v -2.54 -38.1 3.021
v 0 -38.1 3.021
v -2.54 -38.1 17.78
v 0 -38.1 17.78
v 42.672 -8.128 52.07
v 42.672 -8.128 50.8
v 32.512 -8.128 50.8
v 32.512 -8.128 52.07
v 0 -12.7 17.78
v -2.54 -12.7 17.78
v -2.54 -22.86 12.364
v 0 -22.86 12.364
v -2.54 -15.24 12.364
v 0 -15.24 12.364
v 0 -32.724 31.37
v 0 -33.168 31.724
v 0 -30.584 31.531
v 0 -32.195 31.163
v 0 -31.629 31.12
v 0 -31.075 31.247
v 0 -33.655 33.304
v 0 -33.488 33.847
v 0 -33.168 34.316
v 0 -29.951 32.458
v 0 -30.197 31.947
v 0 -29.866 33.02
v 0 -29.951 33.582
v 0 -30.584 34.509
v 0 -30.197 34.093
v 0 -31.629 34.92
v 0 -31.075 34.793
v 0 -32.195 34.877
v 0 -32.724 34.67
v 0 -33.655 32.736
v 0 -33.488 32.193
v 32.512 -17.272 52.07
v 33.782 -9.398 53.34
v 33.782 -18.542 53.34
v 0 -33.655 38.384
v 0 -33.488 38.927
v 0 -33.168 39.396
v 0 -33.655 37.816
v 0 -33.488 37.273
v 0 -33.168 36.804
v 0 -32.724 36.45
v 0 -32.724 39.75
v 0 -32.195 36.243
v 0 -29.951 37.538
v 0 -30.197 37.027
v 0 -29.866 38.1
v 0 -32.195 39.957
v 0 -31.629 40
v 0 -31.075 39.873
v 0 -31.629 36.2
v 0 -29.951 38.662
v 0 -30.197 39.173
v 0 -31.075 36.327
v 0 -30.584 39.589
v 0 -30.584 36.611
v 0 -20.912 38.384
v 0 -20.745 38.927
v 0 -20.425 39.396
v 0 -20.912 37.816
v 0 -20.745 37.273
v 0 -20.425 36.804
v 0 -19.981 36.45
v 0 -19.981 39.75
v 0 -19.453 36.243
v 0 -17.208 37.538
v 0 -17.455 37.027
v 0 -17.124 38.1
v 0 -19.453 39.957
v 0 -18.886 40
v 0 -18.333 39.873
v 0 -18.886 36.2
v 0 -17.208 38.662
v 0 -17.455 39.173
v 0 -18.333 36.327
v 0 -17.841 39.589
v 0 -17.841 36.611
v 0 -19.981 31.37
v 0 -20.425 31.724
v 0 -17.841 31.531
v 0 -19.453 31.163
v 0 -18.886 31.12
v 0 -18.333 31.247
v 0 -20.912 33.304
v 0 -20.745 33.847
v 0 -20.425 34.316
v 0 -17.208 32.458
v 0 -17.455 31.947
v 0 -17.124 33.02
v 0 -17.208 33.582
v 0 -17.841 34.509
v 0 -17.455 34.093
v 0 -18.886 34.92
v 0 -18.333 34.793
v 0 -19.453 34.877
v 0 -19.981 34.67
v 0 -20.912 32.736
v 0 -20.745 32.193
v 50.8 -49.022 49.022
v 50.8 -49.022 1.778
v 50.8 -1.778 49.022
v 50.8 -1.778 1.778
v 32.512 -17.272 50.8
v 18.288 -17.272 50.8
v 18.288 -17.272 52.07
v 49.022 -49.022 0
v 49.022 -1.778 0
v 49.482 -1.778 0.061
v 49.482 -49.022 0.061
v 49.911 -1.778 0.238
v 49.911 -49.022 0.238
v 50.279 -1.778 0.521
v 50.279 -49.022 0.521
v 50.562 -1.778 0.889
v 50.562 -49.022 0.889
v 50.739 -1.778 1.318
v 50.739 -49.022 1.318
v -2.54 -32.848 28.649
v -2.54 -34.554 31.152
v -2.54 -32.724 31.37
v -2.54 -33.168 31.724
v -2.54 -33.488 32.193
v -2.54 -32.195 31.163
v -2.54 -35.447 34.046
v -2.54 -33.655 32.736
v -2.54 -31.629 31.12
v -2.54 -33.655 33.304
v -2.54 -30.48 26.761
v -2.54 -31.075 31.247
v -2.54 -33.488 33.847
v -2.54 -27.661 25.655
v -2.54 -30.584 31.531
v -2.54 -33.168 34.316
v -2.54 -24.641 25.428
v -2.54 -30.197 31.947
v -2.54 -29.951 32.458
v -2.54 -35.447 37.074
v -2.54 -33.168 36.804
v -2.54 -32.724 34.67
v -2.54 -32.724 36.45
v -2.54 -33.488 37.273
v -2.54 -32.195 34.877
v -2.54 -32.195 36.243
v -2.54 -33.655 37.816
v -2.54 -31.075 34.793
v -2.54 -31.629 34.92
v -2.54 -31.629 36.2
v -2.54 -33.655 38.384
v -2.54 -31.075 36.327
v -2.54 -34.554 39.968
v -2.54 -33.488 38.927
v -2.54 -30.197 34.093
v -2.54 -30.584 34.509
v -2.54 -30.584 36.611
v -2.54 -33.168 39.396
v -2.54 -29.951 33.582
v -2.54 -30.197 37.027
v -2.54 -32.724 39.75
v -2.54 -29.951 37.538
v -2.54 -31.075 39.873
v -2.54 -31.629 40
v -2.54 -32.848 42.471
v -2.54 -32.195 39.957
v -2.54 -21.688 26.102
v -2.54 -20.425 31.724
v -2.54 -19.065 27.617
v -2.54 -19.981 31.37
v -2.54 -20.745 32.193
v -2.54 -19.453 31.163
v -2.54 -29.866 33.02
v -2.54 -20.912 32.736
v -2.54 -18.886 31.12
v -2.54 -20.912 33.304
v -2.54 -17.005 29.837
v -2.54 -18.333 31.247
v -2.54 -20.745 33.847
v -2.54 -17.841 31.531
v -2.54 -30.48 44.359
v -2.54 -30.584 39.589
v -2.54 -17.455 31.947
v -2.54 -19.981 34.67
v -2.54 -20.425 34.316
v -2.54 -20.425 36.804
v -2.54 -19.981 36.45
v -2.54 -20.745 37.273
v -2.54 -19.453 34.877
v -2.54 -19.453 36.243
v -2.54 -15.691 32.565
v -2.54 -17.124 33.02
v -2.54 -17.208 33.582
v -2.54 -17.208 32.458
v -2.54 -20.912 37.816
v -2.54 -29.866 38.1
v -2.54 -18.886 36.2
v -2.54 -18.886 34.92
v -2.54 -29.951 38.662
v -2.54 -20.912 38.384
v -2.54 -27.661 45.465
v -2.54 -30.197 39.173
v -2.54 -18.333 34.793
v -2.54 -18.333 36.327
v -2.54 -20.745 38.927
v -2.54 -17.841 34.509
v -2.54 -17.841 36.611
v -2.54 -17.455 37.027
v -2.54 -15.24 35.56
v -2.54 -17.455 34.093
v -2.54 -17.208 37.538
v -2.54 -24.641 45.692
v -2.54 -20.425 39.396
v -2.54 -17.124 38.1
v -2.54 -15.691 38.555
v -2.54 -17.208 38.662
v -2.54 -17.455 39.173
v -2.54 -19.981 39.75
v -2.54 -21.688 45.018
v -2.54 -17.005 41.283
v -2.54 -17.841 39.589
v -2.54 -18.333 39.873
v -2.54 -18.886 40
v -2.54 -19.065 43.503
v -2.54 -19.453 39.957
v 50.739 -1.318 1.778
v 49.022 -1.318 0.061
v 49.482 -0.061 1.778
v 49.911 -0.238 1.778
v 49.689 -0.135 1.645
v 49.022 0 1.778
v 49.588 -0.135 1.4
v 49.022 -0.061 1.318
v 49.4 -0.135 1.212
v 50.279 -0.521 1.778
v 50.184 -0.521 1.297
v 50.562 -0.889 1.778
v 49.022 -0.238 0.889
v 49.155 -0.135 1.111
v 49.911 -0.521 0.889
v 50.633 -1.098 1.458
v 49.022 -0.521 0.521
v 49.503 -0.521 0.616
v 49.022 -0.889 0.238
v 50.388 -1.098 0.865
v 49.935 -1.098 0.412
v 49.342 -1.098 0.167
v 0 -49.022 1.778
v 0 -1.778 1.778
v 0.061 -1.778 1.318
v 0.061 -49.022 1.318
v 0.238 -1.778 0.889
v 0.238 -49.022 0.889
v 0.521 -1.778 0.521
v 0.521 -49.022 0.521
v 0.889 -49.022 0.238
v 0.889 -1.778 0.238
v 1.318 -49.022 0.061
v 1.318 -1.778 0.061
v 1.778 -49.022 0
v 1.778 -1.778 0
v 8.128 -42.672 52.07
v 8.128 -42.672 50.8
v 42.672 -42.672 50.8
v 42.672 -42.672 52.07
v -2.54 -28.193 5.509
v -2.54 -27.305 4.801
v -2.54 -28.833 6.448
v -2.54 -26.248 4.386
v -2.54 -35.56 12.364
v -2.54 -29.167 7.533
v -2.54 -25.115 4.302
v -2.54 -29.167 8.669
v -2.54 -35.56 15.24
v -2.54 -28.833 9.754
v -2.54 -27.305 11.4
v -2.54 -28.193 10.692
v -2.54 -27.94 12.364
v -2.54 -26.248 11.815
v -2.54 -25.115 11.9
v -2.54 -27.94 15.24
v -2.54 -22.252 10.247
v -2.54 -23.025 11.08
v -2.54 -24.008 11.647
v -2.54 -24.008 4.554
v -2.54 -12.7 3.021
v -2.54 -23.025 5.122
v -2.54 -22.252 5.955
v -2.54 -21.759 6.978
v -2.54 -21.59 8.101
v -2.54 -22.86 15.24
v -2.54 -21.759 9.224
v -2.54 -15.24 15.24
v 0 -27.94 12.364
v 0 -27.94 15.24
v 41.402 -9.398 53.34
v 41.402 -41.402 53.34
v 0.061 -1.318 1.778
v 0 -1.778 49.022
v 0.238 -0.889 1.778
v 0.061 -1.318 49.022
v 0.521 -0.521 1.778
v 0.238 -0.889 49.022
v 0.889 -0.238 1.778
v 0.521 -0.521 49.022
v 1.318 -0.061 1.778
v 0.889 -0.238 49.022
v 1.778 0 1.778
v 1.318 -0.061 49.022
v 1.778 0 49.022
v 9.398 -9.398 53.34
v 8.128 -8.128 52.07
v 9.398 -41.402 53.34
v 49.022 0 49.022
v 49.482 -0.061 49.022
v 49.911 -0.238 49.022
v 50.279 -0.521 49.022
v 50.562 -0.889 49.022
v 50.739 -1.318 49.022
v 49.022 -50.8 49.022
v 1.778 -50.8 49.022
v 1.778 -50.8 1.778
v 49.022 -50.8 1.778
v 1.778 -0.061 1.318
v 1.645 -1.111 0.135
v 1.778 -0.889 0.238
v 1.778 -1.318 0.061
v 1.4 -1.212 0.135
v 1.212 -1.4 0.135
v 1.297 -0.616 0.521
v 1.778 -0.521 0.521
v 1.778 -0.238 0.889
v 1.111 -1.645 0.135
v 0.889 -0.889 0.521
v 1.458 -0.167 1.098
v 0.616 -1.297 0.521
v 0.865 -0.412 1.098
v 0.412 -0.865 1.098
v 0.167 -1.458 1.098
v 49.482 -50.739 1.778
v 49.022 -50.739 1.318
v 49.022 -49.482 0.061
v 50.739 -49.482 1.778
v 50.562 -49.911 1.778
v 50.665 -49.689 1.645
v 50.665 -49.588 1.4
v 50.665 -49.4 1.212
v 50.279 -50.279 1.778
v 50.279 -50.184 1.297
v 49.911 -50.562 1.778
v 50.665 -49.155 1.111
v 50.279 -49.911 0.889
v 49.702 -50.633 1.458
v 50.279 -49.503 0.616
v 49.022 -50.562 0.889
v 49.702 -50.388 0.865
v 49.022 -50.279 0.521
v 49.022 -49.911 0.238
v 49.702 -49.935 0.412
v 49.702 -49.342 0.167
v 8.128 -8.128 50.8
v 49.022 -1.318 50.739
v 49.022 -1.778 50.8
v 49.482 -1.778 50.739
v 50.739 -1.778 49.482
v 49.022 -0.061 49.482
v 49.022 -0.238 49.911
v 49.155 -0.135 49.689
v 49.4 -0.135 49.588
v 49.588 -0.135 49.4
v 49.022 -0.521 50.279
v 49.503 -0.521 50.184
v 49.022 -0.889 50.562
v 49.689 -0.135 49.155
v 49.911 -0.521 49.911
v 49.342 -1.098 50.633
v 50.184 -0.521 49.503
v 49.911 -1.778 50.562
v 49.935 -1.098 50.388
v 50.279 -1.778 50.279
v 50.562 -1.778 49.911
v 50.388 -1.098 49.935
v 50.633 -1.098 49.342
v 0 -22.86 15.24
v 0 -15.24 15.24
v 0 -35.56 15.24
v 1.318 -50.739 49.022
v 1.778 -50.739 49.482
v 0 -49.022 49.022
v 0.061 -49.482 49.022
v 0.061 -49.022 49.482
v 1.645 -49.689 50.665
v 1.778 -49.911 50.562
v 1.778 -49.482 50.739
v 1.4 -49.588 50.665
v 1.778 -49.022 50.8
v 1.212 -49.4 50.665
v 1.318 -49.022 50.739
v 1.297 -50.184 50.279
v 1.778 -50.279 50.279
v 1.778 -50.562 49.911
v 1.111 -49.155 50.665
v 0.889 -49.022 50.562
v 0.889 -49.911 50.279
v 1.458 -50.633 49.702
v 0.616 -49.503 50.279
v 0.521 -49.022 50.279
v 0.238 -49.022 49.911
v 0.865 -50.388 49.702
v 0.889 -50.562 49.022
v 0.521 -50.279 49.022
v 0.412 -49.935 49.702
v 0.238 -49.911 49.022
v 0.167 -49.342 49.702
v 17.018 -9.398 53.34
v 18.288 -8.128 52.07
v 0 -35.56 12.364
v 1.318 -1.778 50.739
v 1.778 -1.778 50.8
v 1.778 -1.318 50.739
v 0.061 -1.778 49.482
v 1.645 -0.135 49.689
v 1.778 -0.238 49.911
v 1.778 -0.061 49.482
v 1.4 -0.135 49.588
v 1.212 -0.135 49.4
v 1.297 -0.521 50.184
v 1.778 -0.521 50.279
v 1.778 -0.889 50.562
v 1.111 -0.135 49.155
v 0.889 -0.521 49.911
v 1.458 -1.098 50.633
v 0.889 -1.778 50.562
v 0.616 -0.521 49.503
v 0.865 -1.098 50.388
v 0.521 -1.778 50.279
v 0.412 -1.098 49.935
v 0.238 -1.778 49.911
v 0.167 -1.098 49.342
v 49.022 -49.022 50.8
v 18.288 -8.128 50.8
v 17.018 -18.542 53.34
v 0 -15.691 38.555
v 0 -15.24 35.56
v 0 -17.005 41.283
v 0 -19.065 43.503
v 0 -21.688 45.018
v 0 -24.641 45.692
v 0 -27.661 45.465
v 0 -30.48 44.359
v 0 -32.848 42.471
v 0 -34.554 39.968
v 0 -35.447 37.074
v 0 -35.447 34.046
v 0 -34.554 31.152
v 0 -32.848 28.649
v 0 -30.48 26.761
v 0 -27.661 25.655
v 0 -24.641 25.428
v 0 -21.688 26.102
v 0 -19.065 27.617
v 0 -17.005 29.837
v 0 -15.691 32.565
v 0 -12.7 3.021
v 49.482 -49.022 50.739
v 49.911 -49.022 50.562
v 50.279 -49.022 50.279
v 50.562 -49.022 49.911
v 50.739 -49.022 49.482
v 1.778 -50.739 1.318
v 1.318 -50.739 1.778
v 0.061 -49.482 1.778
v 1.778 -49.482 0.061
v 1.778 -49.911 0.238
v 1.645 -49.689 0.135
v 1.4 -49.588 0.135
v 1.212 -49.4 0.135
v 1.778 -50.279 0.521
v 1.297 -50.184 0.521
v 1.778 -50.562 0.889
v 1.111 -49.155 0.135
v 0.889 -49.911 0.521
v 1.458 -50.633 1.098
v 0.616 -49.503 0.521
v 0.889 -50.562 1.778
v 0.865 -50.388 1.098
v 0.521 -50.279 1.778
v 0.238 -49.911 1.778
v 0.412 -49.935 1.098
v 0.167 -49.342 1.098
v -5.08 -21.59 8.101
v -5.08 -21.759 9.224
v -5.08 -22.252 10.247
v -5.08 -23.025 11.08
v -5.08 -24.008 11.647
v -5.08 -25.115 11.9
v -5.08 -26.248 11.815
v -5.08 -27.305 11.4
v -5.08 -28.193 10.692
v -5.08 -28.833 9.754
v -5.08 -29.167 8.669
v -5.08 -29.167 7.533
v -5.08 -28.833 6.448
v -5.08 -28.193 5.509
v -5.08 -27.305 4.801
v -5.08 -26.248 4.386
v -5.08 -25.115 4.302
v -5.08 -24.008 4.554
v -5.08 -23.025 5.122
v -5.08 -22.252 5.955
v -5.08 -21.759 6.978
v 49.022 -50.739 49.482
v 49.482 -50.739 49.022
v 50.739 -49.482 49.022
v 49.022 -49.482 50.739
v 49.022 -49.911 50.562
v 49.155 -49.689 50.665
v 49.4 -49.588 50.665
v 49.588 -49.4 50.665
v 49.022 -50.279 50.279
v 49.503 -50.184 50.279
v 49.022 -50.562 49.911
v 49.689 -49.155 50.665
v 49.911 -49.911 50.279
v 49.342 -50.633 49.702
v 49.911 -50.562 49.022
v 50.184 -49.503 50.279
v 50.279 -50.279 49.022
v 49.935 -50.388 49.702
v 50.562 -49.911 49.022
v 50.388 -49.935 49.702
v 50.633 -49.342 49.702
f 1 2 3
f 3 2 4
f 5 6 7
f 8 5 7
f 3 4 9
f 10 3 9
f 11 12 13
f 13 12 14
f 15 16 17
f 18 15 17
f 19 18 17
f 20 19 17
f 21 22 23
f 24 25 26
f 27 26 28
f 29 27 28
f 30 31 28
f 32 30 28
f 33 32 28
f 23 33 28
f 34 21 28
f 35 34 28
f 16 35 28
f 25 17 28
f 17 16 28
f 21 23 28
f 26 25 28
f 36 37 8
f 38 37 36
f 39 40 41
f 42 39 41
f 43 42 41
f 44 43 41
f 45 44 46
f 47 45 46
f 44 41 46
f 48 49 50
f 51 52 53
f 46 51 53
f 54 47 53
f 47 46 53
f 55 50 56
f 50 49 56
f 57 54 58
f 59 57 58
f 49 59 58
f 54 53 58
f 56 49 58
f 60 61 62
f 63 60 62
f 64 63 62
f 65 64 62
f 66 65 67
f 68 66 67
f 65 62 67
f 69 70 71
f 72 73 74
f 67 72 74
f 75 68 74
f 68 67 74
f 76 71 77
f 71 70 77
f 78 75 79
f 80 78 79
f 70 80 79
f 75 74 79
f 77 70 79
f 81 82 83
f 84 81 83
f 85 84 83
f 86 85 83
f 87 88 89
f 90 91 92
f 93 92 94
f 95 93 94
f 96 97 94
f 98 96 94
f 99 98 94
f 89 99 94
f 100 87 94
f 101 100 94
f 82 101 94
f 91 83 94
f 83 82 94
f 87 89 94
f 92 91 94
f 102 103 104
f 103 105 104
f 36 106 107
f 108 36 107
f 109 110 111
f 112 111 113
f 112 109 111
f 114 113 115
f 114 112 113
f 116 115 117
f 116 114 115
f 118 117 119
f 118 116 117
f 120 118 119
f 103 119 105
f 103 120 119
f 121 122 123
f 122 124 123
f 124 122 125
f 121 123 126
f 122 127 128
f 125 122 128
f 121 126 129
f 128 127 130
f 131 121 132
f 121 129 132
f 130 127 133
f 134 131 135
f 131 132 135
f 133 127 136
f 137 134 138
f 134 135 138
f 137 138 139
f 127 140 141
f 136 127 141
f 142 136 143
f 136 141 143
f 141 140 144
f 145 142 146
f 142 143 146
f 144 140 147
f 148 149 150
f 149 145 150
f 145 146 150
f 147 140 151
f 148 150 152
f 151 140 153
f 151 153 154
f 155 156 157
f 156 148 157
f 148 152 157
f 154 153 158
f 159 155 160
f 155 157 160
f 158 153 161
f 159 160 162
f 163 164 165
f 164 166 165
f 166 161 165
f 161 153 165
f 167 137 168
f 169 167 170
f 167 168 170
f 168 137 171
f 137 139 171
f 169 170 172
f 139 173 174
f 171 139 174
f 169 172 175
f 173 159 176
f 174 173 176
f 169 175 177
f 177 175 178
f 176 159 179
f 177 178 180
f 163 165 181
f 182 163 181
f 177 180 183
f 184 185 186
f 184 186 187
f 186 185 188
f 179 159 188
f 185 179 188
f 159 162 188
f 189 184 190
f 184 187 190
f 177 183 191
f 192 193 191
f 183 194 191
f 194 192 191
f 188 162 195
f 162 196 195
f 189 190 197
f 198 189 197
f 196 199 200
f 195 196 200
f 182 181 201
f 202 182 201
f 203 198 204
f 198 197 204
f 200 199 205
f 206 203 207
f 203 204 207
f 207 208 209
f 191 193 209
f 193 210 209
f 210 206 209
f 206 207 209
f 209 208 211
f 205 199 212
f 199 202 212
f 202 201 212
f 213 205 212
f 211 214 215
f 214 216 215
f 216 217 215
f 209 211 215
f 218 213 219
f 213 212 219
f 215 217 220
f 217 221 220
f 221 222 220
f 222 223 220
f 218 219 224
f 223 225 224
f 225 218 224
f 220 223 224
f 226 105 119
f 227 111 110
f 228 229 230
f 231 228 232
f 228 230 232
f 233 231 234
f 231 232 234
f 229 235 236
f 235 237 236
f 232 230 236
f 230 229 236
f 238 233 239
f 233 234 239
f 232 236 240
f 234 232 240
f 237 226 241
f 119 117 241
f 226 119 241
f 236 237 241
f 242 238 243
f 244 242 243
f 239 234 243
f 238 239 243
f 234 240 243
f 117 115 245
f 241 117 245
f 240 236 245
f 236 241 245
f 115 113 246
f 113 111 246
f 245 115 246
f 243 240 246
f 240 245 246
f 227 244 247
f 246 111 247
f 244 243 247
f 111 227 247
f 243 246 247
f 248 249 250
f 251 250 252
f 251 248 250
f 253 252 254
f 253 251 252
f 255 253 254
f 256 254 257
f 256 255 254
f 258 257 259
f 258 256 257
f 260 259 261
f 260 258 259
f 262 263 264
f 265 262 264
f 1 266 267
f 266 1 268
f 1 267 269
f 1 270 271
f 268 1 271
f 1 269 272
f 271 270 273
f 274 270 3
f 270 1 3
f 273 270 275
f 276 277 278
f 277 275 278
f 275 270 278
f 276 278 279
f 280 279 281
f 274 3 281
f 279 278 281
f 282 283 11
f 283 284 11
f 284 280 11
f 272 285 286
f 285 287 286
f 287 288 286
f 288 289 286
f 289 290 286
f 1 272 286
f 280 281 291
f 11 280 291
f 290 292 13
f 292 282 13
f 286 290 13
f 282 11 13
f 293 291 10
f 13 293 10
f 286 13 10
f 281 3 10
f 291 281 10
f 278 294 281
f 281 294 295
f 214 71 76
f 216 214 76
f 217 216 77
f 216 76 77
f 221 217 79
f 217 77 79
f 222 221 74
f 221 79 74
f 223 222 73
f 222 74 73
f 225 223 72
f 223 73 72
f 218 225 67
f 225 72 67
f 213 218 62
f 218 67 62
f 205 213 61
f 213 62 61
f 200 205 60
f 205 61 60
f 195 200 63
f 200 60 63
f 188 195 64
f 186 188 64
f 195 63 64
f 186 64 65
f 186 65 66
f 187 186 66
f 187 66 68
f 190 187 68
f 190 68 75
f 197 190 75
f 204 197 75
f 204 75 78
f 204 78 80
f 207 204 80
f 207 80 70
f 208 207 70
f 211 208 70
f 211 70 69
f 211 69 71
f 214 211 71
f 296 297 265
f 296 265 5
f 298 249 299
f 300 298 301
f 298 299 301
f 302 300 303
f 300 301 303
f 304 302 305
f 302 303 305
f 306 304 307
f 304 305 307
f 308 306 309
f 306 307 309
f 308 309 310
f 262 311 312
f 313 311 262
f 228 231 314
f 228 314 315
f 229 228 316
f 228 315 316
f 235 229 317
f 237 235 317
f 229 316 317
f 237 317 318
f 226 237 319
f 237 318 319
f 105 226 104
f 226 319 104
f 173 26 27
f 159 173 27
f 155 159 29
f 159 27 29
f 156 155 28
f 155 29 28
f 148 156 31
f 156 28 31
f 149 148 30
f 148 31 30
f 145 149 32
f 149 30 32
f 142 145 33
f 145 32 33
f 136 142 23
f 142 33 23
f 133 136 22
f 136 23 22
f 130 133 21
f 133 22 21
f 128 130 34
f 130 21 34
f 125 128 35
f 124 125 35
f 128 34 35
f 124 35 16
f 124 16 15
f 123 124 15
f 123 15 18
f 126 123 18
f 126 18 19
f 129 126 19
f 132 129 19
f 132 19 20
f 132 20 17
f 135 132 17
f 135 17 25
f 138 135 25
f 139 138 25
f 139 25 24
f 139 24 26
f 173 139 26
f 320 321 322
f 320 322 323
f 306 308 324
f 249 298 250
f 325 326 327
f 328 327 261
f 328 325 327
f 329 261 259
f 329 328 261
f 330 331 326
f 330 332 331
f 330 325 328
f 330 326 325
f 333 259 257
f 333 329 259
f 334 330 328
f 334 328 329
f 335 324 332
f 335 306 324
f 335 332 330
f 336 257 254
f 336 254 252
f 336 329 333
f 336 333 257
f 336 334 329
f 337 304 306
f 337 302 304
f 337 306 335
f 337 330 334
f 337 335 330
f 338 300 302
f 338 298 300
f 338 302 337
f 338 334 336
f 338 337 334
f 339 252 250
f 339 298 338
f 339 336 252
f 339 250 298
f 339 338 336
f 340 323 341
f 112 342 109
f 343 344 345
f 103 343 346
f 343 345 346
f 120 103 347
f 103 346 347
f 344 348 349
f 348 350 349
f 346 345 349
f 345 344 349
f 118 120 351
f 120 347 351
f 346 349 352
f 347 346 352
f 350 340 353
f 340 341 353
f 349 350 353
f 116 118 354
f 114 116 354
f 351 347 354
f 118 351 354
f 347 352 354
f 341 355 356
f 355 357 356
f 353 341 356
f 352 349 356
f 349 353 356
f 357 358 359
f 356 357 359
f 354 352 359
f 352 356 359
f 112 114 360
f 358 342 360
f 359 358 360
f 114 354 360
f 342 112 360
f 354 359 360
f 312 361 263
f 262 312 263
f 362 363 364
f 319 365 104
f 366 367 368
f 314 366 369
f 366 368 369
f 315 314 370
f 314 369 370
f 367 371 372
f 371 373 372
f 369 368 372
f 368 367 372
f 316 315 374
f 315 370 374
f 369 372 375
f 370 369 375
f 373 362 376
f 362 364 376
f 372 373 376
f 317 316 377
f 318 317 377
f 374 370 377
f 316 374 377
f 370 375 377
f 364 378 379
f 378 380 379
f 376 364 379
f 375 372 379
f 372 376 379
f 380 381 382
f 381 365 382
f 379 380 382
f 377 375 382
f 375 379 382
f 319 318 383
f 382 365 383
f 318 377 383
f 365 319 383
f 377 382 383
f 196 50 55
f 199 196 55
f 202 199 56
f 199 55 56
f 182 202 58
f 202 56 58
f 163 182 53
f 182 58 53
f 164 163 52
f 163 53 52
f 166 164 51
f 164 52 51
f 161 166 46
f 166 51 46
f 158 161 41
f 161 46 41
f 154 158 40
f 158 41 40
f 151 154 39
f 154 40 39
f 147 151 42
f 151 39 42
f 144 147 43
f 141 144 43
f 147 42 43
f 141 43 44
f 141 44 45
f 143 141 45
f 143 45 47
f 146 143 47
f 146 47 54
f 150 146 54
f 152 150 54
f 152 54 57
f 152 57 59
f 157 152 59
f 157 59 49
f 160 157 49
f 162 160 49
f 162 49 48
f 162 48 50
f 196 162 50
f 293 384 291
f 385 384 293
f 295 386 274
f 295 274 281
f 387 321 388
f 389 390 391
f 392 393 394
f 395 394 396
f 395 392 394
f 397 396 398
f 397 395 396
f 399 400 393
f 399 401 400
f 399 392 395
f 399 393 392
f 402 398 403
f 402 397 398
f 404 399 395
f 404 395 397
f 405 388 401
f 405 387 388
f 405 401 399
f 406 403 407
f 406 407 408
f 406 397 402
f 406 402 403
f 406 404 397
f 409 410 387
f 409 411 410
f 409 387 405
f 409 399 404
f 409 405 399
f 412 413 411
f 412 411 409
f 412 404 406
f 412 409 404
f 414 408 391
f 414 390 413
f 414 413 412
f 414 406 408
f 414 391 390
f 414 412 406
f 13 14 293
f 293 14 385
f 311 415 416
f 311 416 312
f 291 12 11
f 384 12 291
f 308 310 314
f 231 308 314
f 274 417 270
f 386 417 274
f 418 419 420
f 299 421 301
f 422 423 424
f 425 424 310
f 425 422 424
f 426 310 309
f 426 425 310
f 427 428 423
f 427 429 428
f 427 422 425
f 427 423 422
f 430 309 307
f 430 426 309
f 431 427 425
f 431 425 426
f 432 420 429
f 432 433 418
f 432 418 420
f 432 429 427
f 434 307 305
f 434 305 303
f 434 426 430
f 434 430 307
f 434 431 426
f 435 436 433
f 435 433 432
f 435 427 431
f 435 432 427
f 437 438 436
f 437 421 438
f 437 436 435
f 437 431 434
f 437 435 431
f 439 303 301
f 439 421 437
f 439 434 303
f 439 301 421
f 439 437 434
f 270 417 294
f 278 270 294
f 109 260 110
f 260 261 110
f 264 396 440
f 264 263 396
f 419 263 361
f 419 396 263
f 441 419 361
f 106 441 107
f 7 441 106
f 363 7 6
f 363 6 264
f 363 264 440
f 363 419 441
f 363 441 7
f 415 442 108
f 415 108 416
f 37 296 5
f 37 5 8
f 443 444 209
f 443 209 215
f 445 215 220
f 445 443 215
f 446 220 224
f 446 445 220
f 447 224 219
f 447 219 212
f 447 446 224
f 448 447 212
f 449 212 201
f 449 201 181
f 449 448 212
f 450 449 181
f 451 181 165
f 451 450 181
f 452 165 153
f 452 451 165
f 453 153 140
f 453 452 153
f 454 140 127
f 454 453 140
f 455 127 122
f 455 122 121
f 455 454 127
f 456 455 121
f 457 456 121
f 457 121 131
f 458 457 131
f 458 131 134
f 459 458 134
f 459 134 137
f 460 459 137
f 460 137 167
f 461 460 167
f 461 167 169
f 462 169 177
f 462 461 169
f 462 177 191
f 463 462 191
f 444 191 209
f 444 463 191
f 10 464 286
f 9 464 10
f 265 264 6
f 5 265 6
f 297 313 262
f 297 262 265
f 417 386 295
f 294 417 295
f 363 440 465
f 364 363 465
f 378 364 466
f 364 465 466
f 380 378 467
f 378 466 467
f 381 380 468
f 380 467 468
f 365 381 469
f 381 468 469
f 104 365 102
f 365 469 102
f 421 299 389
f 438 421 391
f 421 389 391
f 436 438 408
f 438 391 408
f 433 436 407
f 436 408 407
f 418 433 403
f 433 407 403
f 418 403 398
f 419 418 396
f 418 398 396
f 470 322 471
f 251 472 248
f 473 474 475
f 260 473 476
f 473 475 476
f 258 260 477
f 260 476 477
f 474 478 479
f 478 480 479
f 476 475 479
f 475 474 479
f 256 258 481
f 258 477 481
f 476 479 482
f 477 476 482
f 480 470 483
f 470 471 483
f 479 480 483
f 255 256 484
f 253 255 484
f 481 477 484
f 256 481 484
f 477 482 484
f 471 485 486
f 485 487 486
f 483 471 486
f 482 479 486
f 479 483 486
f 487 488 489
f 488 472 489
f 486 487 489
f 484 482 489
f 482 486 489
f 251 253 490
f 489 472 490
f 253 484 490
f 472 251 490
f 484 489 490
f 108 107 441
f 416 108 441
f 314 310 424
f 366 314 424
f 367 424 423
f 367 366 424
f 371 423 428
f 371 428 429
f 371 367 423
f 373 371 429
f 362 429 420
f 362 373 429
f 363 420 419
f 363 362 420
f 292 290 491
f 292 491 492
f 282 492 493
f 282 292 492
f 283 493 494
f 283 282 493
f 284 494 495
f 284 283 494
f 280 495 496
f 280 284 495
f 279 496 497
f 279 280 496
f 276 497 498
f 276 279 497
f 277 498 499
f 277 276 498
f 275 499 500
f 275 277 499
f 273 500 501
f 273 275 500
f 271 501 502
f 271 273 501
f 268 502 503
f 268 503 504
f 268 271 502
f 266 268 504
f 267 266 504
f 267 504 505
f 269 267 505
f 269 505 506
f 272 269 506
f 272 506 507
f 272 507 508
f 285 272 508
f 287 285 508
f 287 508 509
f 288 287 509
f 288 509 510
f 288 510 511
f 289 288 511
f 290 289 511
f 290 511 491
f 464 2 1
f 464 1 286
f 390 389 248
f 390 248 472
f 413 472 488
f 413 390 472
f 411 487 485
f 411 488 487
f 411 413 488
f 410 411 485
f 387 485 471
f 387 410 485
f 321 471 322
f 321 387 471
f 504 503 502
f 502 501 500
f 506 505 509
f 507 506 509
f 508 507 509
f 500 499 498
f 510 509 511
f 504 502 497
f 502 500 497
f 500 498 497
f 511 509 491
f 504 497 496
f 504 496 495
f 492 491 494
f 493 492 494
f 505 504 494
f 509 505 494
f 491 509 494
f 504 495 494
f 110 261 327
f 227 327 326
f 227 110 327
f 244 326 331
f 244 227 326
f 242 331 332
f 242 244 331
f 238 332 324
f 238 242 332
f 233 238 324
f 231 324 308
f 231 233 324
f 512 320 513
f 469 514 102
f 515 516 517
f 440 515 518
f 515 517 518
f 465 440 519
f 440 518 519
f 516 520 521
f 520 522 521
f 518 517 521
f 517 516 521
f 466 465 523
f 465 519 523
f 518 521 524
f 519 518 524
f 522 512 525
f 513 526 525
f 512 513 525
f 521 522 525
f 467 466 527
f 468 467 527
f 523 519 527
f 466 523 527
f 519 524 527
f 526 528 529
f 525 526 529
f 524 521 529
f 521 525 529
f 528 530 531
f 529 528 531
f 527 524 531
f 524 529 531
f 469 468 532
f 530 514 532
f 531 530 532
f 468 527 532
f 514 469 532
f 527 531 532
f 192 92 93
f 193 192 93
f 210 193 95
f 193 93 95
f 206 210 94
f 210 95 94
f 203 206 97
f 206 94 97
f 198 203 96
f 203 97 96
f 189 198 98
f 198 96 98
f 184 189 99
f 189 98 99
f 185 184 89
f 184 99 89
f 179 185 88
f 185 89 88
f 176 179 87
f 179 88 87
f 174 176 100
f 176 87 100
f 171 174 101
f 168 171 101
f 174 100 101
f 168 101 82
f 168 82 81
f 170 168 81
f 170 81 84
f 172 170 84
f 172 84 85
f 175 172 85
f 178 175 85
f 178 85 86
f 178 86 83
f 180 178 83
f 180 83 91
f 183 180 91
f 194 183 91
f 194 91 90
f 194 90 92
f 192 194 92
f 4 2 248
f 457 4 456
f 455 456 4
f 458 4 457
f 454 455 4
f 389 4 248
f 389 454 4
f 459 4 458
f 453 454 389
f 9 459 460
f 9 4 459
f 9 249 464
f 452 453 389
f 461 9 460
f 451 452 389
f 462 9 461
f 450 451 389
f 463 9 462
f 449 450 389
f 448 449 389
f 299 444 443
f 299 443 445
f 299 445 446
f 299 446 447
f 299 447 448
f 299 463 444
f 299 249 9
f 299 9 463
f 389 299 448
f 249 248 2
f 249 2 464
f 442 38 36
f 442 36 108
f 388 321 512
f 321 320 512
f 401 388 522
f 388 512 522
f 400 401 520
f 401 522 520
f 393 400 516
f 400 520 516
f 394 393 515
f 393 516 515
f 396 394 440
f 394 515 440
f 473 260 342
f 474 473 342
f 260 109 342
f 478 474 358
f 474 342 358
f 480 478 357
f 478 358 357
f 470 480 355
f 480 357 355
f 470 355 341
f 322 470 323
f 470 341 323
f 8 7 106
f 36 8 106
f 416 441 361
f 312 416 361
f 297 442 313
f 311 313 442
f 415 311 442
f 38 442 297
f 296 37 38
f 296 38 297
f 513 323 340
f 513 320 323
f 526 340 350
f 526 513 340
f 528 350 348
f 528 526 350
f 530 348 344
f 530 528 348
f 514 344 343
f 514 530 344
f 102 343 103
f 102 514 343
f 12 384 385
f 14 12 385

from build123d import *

# Parameters (mm, degrees)
F0_W      = 50.8
F0_H      = 50.8
F1_DEPTH  = 50.8
F2_R      = 10.16
F3_DEPTH  = 2.54
F4_W      = 25.4
F4_H      = 14.759139
F5_DEPTH  = 2.54
F6_W      = 7.62
F6_H      = 2.876111
F7_DEPTH  = 5.08
F8_R      = 3.81
F9_DEPTH  = 5.08
F10_R     = 1.905
F11_DEPTH = 20.32
F12_R     = 1.778
F14_DEPTH = 53.34
F15_SIZE  = 1.27


with BuildPart() as f1:
    # F0 (on Front) → F1 (new body)
    with BuildSketch(Plane.XZ):
        with Locations((25.4, 25.4)):
            Rectangle(F0_W, F0_H)
    extrude(amount=F1_DEPTH)

    # F2 (on Right) → F3 (join)
    with BuildSketch(Plane.YZ):
        with Locations((-25.4, 35.56)):
            Circle(F2_R)
    extrude(amount=-F3_DEPTH)

    # F4 (on Right) → F5 (join)
    with BuildSketch(Plane.YZ):
        with Locations((-25.4, 10.40043)):
            Rectangle(F4_W, F4_H)
    extrude(amount=-F5_DEPTH)

    # F6 (on Right) → F7 (cut)
    with BuildSketch(Plane.YZ):
        with Locations((-19.05, 13.801944)):
            Rectangle(F6_W, F6_H)
        with Locations((-31.75, 13.801944)):
            Rectangle(F6_W, F6_H)
    extrude(amount=-F7_DEPTH, mode=Mode.SUBTRACT)

    # F8 (on Right) → F9 (join)
    with BuildSketch(Plane.YZ):
        with Locations((-25.4, 8.100861)):
            Circle(F8_R)
    extrude(amount=-F9_DEPTH)

    # F10 (on Right) → F11 (cut)
    with BuildSketch(Plane.YZ):
        with Locations((-31.771343, 38.1)):
            Circle(F10_R)
        with Locations((-19.028657, 38.1)):
            Circle(F10_R)
        with Locations((-19.028657, 33.02)):
            Circle(F10_R)
        with Locations((-31.771343, 33.02)):
            Circle(F10_R)
    extrude(amount=-F11_DEPTH, mode=Mode.SUBTRACT)

    # F12
    f12_edges = [f1.edges().sort_by_distance(p)[0] for p in [
        (0, -50.8, 25.4),
        (25.4, -50.8, 0),
        (50.8, -50.8, 25.4),
        (25.4, -50.8, 50.8),
        (50.8, -25.4, 50.8),
        (0, -25.4, 50.8),
        (25.4, 0, 50.8),
        (50.8, -25.4, 0),
        (50.8, 0, 25.4),
        (0, 0, 25.4),
        (25.4, 0, 0),
        (0, -25.4, 0),
    ]]
    fillet(f12_edges, radius=F12_R)

    # F13 (on Top) → F14 (join)
    with BuildSketch(Plane.XY):
        Polygon((18.288, -8.128), (8.128, -8.128), (8.128, -42.672), (42.672, -42.672), (42.672, -8.128), (32.512, -8.128), (32.512, -17.272), (18.288, -17.272), align=None)
    extrude(amount=F14_DEPTH)

    # F15
    f15_edges = [f1.edges().sort_by_distance(p)[0] for p in [
        (13.208, -8.128, 53.34),
        (8.128, -25.4, 53.34),
        (25.4, -42.672, 53.34),
        (42.672, -25.4, 53.34),
        (37.592, -8.128, 53.34),
        (32.512, -12.7, 53.34),
        (25.4, -17.272, 53.34),
        (18.288, -12.7, 53.34),
    ]]
    chamfer(f15_edges, length=F15_SIZE)


solid = f1.part
